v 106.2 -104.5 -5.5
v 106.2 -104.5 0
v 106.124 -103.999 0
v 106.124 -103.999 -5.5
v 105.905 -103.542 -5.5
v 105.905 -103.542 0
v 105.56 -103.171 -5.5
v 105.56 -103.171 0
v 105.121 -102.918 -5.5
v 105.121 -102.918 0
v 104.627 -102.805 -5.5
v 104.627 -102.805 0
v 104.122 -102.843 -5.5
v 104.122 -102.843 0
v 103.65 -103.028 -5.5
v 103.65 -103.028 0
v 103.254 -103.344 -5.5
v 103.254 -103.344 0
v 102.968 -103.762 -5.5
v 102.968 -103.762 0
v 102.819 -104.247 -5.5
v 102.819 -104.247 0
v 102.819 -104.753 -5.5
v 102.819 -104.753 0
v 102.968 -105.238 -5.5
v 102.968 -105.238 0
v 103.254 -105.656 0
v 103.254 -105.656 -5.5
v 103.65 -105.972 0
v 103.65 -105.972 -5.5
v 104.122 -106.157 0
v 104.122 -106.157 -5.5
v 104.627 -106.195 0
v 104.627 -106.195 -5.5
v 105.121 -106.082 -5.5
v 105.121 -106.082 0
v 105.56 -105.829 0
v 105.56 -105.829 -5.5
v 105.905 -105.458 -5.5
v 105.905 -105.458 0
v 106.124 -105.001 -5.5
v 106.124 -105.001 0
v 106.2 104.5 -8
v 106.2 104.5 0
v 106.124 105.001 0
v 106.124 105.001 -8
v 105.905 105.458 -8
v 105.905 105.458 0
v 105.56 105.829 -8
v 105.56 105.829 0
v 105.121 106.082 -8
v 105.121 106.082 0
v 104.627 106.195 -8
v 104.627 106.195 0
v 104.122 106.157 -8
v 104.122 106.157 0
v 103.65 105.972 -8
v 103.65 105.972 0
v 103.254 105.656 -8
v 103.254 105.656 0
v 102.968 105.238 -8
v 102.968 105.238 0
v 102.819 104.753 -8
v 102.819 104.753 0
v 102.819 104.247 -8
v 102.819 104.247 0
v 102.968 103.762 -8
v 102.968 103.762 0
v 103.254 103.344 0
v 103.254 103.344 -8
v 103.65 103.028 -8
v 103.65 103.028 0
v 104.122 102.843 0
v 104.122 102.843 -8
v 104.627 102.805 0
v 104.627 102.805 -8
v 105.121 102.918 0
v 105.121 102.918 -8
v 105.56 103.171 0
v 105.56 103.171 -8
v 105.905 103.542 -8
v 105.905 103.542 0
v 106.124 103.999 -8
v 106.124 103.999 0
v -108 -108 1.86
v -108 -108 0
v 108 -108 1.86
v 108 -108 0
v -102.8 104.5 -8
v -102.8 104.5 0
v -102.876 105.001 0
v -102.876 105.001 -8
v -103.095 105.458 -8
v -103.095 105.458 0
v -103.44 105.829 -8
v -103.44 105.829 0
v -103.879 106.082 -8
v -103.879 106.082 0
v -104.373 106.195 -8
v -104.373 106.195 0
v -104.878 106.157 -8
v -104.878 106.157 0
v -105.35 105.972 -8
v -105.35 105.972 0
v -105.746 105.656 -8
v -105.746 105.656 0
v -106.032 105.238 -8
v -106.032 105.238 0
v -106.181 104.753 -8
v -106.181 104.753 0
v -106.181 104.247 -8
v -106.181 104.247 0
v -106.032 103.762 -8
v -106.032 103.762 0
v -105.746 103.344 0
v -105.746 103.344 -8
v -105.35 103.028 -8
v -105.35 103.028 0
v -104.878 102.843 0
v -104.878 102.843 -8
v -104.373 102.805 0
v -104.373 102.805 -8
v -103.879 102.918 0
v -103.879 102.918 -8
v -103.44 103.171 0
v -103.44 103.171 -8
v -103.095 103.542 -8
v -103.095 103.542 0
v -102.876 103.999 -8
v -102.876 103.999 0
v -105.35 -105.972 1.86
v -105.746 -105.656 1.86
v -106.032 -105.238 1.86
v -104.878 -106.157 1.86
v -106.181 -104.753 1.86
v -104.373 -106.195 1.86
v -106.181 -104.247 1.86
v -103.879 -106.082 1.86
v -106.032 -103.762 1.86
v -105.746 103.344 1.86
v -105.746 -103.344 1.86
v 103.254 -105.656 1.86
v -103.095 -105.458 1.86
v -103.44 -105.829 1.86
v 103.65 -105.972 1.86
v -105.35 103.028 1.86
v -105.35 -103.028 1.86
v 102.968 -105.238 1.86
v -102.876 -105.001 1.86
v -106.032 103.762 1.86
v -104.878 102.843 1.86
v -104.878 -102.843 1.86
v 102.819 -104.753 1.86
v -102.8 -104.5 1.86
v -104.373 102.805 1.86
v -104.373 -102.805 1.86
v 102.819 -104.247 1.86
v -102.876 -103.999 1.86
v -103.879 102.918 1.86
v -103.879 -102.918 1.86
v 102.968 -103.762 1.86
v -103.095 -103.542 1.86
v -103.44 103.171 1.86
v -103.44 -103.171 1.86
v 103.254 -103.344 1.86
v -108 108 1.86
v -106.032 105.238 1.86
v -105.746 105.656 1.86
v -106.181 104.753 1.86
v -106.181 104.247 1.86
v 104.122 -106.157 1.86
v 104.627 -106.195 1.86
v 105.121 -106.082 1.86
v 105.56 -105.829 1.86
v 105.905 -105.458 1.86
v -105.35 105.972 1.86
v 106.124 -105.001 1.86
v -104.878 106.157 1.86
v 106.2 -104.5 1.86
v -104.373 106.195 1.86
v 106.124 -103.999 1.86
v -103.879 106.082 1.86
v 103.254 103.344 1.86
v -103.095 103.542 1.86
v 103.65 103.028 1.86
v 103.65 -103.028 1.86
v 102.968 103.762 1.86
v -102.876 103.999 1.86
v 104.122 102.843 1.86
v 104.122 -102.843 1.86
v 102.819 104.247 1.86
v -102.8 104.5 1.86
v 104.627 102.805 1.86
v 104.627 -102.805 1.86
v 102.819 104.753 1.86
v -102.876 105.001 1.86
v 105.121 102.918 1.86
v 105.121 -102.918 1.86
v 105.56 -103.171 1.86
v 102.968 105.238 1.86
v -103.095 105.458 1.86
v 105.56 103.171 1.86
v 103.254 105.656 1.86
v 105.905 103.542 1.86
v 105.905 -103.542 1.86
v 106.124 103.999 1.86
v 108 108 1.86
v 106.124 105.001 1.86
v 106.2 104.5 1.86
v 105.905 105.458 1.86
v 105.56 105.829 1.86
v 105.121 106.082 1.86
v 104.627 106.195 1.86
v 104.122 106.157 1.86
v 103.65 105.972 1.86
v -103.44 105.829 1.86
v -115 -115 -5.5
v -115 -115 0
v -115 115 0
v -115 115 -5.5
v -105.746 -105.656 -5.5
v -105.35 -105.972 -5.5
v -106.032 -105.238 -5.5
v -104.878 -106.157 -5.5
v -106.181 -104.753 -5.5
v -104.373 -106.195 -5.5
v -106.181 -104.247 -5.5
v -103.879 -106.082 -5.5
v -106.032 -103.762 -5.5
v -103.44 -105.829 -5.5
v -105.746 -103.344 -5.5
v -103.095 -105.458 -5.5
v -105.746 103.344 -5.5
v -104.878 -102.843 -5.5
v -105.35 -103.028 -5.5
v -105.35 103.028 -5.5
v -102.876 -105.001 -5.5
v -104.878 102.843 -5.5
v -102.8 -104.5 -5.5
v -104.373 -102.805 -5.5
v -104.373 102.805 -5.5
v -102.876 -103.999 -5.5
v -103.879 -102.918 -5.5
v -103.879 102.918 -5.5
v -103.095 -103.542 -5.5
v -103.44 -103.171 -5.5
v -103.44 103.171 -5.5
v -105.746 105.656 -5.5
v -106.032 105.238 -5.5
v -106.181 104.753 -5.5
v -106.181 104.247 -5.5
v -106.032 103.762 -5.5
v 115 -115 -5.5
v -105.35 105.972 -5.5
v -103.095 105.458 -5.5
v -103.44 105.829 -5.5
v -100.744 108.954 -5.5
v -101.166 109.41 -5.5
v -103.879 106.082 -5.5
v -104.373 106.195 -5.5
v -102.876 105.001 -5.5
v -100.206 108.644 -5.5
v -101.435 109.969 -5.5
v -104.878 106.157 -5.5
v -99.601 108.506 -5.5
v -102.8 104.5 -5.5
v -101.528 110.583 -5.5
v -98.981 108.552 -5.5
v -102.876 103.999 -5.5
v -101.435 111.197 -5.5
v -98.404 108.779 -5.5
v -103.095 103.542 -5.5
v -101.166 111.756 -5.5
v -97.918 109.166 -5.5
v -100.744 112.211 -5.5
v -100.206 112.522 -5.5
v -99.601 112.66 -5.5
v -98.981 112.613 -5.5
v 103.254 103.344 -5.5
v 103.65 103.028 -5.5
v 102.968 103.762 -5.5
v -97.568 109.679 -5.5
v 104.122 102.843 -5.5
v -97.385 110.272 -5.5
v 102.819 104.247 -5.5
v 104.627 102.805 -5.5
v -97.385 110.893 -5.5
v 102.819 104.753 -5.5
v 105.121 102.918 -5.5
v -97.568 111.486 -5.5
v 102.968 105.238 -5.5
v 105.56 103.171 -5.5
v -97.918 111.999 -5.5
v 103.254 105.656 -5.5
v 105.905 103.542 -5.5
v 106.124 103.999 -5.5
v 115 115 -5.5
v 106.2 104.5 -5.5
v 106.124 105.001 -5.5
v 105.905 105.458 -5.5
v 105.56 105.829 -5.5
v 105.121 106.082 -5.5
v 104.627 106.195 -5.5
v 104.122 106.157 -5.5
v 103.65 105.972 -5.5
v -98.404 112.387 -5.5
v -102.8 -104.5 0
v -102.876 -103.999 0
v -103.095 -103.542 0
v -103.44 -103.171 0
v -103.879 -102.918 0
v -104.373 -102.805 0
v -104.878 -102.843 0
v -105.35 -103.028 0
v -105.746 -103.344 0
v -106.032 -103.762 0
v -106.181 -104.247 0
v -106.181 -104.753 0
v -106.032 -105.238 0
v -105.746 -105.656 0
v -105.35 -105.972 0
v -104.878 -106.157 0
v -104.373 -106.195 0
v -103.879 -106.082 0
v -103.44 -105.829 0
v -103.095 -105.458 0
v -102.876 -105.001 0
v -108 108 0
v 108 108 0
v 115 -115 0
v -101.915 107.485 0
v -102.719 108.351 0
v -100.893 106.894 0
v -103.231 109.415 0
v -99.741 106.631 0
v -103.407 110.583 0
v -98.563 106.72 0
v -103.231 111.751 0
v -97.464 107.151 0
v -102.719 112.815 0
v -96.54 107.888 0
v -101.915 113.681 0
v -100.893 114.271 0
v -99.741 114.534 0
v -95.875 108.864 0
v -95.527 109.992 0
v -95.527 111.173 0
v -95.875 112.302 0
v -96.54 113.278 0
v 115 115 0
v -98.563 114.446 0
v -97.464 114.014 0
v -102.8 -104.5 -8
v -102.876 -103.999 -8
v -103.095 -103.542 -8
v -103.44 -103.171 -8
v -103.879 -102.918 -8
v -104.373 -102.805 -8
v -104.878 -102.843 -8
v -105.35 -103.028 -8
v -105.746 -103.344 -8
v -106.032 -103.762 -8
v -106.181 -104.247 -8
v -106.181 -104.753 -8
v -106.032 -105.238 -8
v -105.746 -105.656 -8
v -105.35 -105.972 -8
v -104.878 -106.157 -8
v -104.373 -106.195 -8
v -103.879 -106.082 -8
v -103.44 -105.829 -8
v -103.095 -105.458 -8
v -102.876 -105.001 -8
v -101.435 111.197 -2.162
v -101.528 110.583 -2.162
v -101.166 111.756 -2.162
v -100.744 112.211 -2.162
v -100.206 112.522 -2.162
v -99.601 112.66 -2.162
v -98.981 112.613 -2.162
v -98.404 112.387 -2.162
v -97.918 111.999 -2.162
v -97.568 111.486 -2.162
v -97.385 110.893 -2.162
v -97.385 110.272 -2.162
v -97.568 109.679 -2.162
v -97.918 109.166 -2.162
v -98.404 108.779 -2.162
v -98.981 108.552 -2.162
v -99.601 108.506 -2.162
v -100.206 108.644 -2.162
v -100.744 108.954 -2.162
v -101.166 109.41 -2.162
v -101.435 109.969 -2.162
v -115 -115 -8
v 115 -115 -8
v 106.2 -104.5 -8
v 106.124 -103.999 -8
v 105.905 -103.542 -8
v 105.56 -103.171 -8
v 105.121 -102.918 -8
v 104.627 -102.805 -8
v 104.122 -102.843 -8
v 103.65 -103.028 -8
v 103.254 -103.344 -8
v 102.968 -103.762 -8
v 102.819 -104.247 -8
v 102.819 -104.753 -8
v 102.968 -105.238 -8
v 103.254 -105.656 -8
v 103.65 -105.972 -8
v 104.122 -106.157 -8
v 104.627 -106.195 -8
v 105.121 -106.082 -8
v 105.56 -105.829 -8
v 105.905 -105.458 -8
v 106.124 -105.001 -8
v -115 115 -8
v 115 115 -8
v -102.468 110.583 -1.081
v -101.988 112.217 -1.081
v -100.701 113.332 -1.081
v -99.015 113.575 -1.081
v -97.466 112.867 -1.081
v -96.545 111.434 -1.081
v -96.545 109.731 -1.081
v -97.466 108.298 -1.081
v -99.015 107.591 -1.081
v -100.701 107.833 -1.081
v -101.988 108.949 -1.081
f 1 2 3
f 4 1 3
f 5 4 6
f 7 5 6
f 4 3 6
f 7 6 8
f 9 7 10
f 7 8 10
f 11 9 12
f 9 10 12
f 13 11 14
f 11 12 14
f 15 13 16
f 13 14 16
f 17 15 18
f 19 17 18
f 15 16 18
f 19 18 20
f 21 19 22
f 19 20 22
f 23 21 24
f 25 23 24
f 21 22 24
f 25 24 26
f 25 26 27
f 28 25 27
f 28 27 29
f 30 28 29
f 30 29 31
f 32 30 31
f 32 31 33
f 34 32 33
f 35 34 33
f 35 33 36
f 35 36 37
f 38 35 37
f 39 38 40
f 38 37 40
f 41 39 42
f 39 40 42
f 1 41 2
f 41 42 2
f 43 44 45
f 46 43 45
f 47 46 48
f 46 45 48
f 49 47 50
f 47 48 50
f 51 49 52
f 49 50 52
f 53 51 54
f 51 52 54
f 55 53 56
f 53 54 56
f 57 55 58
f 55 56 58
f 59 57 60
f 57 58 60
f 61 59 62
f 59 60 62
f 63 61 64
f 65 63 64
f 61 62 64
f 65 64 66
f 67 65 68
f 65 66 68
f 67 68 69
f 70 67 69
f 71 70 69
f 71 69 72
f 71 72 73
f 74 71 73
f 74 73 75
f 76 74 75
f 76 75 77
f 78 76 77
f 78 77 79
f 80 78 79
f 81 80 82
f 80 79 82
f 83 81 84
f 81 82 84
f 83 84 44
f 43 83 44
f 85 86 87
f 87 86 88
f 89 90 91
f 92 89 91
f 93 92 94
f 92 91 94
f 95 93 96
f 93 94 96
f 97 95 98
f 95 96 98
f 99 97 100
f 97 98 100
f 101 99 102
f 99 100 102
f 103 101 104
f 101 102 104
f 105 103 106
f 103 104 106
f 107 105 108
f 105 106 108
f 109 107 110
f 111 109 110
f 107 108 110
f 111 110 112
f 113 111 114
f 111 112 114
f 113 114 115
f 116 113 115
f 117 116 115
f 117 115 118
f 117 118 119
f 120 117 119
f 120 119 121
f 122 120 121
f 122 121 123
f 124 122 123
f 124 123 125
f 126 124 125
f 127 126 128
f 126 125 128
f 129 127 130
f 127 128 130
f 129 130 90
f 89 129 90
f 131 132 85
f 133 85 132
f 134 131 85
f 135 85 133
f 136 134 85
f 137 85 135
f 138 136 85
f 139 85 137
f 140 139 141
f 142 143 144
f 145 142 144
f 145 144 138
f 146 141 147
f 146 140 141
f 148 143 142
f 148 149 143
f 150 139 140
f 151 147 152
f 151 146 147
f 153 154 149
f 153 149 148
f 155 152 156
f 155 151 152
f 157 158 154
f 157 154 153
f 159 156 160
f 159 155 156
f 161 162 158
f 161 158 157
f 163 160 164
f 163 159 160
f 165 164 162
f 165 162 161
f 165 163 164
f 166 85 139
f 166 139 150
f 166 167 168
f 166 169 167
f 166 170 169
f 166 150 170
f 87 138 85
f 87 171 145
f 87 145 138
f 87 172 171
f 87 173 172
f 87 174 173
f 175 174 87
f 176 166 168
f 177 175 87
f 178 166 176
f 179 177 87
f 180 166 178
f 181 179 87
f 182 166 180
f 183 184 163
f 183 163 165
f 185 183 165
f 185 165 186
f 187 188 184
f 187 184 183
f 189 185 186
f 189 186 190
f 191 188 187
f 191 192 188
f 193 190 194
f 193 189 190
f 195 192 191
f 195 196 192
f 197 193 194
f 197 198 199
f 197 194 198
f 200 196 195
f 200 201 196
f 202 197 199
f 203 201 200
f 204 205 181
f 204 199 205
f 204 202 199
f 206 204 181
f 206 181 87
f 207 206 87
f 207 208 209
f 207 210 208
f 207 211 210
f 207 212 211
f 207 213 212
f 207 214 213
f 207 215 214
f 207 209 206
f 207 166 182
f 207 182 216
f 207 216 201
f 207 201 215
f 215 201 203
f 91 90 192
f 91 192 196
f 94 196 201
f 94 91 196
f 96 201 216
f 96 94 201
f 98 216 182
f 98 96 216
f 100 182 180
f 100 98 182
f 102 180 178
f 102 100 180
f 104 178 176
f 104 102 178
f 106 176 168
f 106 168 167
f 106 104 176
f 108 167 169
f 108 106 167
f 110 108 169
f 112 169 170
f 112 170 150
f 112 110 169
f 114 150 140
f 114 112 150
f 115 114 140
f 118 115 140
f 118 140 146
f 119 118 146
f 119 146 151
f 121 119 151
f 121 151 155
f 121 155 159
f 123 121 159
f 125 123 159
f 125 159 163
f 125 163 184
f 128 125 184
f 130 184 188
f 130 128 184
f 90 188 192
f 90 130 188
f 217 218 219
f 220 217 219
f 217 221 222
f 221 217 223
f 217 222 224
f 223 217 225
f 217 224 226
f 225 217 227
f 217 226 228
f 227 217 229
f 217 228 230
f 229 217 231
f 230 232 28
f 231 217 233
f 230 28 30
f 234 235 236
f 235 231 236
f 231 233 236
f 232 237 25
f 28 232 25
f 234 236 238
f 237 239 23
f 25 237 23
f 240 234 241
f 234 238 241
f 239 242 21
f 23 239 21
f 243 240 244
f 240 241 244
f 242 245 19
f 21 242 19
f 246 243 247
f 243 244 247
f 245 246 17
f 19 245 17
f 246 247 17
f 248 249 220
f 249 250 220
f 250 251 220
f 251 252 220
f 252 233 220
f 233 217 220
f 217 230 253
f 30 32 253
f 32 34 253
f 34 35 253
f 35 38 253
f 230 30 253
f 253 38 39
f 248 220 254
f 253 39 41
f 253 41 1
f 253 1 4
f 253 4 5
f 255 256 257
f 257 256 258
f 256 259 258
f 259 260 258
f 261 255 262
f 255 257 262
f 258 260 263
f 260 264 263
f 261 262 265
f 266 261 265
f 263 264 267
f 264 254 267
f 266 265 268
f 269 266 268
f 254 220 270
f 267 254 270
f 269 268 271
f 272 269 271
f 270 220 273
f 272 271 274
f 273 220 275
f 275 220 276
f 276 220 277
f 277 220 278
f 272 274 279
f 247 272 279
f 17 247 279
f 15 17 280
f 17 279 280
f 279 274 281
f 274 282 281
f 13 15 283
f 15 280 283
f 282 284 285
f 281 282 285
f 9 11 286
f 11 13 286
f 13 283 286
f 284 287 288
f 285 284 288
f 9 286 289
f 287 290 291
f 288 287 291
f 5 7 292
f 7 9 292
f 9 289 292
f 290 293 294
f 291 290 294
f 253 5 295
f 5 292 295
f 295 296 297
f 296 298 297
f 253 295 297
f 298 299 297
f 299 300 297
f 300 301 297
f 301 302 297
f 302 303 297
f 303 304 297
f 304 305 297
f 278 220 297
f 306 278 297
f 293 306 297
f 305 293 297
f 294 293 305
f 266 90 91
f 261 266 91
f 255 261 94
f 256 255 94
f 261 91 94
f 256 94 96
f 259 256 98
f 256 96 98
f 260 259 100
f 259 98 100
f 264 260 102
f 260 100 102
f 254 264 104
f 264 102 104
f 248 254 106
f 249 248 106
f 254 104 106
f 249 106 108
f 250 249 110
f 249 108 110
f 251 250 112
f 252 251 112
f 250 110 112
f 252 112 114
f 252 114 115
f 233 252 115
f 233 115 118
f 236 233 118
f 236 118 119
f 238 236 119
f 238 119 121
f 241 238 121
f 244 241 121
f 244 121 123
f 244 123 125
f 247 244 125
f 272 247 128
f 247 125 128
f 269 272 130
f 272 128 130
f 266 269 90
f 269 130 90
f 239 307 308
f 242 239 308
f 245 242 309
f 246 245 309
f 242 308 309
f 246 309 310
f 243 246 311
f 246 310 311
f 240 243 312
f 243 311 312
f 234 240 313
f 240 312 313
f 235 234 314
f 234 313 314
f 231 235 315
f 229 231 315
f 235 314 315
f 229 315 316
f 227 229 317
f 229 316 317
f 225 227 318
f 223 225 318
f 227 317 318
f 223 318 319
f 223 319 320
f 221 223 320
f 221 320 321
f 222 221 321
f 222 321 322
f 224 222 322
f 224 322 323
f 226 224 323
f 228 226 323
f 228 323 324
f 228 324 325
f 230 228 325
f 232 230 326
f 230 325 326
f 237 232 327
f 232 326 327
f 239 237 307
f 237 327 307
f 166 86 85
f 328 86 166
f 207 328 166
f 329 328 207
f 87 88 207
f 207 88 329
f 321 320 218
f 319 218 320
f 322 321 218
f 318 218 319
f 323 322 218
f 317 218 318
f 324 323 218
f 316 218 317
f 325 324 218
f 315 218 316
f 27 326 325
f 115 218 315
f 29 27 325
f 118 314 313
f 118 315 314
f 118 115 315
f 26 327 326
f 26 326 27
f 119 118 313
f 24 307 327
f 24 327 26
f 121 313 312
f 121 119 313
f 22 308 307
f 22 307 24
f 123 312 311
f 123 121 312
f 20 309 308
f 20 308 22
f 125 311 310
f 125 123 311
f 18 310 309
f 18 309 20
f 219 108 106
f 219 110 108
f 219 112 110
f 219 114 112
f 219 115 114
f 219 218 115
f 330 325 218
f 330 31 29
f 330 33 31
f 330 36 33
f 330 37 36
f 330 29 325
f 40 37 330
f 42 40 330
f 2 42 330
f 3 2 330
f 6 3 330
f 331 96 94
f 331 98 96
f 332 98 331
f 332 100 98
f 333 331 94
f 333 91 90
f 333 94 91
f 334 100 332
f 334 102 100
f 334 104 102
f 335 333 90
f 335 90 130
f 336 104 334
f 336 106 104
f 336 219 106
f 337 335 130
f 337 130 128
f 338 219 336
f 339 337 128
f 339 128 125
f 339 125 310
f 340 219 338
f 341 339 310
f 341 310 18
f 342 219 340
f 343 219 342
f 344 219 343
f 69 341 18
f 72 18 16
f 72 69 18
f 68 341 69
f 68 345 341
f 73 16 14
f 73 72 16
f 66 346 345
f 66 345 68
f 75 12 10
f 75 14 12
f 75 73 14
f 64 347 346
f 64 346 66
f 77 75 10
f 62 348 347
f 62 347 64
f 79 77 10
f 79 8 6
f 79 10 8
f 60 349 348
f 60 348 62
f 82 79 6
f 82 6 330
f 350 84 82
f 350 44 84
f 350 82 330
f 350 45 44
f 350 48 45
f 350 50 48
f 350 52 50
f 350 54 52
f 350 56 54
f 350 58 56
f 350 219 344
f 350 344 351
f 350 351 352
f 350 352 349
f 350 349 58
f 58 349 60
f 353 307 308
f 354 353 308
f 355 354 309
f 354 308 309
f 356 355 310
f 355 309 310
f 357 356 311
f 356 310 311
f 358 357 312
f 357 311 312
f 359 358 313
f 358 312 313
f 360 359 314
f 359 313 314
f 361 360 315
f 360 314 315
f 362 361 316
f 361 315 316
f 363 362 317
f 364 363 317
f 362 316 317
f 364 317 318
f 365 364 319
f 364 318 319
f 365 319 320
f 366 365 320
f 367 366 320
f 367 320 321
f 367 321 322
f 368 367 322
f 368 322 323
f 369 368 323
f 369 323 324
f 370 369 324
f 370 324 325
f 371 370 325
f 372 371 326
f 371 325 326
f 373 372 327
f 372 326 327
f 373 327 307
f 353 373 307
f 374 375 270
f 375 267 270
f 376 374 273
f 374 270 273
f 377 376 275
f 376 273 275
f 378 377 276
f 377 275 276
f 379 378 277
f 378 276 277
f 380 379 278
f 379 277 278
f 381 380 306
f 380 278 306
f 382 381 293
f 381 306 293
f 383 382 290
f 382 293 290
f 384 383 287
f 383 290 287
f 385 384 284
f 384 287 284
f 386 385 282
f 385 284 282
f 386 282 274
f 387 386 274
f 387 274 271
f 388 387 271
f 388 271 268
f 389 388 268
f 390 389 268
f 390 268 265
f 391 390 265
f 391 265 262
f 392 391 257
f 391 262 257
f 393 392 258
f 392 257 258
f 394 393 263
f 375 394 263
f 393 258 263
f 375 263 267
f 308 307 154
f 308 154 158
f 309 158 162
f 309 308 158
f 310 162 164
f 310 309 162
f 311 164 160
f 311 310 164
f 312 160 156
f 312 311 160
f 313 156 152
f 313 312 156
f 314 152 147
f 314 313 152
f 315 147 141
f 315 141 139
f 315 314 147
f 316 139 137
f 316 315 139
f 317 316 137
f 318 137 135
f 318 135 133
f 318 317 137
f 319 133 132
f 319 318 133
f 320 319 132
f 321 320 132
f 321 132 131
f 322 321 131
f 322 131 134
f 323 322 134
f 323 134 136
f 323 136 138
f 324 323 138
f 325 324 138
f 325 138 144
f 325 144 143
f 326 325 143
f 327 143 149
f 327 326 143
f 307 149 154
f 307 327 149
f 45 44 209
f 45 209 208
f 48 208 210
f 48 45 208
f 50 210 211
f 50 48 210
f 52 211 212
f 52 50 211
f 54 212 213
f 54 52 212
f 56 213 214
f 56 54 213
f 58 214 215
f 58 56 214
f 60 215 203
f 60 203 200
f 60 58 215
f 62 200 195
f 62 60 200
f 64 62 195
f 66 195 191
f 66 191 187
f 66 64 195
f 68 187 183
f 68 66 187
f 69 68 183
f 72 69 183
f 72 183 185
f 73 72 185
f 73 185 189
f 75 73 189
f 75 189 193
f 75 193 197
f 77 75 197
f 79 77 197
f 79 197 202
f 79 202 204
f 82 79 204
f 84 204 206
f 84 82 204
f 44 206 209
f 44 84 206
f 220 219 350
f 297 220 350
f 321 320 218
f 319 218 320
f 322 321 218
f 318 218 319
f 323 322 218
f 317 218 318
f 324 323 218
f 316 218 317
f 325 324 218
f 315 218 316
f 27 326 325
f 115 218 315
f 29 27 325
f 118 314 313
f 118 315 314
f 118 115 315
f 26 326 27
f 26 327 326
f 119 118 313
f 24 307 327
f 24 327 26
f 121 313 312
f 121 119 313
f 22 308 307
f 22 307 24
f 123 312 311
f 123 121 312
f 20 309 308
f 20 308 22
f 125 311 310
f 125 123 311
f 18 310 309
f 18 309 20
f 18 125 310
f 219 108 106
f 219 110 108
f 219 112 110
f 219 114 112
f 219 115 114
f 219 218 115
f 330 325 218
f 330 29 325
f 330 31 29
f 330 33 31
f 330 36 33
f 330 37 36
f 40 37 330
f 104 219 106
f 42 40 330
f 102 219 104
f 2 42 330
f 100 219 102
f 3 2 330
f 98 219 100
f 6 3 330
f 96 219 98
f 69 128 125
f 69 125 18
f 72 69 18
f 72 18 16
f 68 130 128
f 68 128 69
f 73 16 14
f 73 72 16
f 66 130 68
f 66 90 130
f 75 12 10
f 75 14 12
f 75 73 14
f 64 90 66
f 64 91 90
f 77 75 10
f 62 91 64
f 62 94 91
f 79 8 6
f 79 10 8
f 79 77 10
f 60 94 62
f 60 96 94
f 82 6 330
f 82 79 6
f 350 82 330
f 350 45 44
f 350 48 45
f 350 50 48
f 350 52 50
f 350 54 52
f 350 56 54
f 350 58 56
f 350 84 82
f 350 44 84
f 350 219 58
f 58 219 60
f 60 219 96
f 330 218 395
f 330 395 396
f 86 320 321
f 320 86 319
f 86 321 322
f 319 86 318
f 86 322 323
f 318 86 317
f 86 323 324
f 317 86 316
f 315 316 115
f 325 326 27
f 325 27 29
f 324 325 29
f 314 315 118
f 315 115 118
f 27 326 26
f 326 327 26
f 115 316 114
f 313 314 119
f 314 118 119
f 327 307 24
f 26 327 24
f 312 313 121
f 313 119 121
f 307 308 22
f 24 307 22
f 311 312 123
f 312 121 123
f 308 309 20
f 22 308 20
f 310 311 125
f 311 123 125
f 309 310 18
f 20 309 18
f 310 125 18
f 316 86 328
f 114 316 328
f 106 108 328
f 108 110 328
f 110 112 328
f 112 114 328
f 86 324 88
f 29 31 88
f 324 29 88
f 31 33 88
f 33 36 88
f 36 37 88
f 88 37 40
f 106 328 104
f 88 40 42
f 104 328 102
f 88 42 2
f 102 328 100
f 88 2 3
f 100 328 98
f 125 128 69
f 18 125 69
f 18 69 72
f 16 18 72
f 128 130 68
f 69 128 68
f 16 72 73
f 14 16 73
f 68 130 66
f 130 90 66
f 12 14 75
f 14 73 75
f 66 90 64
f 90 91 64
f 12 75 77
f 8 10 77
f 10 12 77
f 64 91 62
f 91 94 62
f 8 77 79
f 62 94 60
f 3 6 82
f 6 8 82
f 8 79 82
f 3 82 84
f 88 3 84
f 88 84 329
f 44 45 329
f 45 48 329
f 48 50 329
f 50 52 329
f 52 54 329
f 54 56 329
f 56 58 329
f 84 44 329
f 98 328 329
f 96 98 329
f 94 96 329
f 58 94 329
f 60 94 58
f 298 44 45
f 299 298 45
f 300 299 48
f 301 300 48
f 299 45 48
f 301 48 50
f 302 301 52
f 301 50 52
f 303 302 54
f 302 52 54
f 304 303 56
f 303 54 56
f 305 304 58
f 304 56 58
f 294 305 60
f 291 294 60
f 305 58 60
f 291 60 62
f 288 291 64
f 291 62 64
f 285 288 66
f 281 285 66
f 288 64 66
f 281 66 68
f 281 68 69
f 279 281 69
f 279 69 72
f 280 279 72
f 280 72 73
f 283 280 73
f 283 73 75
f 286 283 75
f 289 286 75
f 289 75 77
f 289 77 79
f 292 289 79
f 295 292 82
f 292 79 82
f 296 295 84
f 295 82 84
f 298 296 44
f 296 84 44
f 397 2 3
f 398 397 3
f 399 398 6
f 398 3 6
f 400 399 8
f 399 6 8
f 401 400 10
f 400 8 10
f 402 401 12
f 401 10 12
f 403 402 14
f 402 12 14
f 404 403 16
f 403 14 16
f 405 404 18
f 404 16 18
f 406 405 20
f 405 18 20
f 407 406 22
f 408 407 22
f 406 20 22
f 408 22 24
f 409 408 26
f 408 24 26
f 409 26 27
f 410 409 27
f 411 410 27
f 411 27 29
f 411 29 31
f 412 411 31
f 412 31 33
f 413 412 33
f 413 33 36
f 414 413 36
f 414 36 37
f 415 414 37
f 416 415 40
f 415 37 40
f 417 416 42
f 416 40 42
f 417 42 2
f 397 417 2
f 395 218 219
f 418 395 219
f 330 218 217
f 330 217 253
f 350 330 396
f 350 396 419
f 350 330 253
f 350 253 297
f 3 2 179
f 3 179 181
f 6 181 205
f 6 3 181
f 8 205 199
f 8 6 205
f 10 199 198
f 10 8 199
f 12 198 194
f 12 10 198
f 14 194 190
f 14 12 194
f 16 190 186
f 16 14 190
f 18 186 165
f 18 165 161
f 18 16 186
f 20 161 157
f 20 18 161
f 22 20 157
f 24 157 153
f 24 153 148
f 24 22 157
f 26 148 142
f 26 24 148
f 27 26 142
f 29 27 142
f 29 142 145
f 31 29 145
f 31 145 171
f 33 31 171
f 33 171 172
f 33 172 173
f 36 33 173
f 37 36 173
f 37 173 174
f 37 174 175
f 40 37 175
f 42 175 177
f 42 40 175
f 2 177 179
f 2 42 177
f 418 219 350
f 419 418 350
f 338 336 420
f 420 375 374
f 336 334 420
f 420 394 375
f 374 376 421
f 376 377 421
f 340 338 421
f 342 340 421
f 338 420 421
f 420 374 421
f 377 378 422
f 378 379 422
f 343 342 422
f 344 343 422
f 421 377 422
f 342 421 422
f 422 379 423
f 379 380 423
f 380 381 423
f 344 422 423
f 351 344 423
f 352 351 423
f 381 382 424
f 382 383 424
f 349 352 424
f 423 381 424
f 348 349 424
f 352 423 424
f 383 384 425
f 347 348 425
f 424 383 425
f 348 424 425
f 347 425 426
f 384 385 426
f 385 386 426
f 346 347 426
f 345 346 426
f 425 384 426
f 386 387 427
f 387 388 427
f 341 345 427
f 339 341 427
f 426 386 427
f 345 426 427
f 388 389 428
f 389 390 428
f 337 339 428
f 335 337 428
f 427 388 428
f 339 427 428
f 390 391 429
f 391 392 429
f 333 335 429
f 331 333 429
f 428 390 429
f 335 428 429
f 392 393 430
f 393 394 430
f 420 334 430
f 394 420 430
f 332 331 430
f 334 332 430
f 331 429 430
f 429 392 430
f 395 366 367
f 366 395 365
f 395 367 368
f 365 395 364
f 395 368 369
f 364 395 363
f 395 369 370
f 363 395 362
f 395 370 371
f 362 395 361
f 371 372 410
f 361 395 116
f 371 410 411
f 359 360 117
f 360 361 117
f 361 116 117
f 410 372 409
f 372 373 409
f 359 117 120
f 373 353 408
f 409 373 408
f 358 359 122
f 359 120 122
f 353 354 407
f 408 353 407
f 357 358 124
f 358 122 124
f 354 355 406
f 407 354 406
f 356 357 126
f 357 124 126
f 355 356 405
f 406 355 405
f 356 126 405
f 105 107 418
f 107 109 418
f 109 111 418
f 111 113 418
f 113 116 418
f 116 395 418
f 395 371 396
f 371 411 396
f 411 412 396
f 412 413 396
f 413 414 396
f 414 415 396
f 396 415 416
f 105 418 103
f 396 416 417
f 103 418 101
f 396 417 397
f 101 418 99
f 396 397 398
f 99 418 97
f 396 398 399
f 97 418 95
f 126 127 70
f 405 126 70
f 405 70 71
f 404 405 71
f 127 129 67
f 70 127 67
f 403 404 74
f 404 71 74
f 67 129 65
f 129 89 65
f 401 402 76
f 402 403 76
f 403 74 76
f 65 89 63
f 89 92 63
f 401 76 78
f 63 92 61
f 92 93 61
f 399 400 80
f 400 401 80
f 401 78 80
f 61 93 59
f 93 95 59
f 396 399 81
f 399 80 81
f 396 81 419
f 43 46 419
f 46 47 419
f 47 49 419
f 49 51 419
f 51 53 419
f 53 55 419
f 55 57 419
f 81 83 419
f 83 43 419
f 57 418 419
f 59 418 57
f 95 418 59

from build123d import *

# Parameters (mm, degrees)
F0_W           = 216
F0_H           = 216
F0_R           = 1.7
F1_DEPTH       = 1.86
F2_W           = 230
F2_H           = 230
F2_R           = 1.7
F3_DEPTH       = 8
F4_W           = 230
F4_H           = 230
F4_R           = 1.7
F5_DEPTH       = 5.5
F6_D           = 4.1656
F6_CSINK_D     = 7.9248
F6_CSINK_ANGLE = 82


with BuildPart() as f1:
    # F0 (on Top) → F1 (new body)
    with BuildSketch(Plane.XY):
        Rectangle(F0_W, F0_H)
        with Locations((-104.5, -104.5)):
            Circle(F0_R, mode=Mode.SUBTRACT)
        with Locations((104.5, -104.5)):
            Circle(F0_R, mode=Mode.SUBTRACT)
        with Locations((-104.5, 104.5)):
            Circle(F0_R, mode=Mode.SUBTRACT)
        with Locations((104.5, 104.5)):
            Circle(F0_R, mode=Mode.SUBTRACT)
    extrude(amount=F1_DEPTH)


with BuildPart() as f3:
    # F2 (on Top) → F3 (new body)
    with BuildSketch(Plane.XY):
        Rectangle(F2_W, F2_H)
        with Locations((-104.5, -104.5)):
            Circle(F2_R, mode=Mode.SUBTRACT)
        with Locations((104.5, -104.5)):
            Circle(F2_R, mode=Mode.SUBTRACT)
        with Locations((-104.5, 104.5)):
            Circle(F2_R, mode=Mode.SUBTRACT)
        with Locations((104.5, 104.5)):
            Circle(F2_R, mode=Mode.SUBTRACT)
    extrude(amount=-F3_DEPTH)


with BuildPart() as f5:
    # F4 (on face) → F5 (new body)
    with BuildSketch(Plane.XY):
        Rectangle(F4_W, F4_H)
        with Locations((-104.5, -104.5)):
            Circle(F4_R, mode=Mode.SUBTRACT)
        with Locations((104.5, -104.5)):
            Circle(F4_R, mode=Mode.SUBTRACT)
        with Locations((-104.5, 104.5)):
            Circle(F4_R, mode=Mode.SUBTRACT)
        with Locations((104.5, 104.5)):
            Circle(F4_R, mode=Mode.SUBTRACT)
    extrude(amount=-F5_DEPTH)

    # F6 (through all)
    with Locations(Plane.XY):
        with Locations((-99.4449332356, 110.5828)):
            CounterSinkHole(F6_D / 2, F6_CSINK_D / 2, counter_sink_angle=F6_CSINK_ANGLE)


solid = Compound([f1.part, f3.part, f5.part])
